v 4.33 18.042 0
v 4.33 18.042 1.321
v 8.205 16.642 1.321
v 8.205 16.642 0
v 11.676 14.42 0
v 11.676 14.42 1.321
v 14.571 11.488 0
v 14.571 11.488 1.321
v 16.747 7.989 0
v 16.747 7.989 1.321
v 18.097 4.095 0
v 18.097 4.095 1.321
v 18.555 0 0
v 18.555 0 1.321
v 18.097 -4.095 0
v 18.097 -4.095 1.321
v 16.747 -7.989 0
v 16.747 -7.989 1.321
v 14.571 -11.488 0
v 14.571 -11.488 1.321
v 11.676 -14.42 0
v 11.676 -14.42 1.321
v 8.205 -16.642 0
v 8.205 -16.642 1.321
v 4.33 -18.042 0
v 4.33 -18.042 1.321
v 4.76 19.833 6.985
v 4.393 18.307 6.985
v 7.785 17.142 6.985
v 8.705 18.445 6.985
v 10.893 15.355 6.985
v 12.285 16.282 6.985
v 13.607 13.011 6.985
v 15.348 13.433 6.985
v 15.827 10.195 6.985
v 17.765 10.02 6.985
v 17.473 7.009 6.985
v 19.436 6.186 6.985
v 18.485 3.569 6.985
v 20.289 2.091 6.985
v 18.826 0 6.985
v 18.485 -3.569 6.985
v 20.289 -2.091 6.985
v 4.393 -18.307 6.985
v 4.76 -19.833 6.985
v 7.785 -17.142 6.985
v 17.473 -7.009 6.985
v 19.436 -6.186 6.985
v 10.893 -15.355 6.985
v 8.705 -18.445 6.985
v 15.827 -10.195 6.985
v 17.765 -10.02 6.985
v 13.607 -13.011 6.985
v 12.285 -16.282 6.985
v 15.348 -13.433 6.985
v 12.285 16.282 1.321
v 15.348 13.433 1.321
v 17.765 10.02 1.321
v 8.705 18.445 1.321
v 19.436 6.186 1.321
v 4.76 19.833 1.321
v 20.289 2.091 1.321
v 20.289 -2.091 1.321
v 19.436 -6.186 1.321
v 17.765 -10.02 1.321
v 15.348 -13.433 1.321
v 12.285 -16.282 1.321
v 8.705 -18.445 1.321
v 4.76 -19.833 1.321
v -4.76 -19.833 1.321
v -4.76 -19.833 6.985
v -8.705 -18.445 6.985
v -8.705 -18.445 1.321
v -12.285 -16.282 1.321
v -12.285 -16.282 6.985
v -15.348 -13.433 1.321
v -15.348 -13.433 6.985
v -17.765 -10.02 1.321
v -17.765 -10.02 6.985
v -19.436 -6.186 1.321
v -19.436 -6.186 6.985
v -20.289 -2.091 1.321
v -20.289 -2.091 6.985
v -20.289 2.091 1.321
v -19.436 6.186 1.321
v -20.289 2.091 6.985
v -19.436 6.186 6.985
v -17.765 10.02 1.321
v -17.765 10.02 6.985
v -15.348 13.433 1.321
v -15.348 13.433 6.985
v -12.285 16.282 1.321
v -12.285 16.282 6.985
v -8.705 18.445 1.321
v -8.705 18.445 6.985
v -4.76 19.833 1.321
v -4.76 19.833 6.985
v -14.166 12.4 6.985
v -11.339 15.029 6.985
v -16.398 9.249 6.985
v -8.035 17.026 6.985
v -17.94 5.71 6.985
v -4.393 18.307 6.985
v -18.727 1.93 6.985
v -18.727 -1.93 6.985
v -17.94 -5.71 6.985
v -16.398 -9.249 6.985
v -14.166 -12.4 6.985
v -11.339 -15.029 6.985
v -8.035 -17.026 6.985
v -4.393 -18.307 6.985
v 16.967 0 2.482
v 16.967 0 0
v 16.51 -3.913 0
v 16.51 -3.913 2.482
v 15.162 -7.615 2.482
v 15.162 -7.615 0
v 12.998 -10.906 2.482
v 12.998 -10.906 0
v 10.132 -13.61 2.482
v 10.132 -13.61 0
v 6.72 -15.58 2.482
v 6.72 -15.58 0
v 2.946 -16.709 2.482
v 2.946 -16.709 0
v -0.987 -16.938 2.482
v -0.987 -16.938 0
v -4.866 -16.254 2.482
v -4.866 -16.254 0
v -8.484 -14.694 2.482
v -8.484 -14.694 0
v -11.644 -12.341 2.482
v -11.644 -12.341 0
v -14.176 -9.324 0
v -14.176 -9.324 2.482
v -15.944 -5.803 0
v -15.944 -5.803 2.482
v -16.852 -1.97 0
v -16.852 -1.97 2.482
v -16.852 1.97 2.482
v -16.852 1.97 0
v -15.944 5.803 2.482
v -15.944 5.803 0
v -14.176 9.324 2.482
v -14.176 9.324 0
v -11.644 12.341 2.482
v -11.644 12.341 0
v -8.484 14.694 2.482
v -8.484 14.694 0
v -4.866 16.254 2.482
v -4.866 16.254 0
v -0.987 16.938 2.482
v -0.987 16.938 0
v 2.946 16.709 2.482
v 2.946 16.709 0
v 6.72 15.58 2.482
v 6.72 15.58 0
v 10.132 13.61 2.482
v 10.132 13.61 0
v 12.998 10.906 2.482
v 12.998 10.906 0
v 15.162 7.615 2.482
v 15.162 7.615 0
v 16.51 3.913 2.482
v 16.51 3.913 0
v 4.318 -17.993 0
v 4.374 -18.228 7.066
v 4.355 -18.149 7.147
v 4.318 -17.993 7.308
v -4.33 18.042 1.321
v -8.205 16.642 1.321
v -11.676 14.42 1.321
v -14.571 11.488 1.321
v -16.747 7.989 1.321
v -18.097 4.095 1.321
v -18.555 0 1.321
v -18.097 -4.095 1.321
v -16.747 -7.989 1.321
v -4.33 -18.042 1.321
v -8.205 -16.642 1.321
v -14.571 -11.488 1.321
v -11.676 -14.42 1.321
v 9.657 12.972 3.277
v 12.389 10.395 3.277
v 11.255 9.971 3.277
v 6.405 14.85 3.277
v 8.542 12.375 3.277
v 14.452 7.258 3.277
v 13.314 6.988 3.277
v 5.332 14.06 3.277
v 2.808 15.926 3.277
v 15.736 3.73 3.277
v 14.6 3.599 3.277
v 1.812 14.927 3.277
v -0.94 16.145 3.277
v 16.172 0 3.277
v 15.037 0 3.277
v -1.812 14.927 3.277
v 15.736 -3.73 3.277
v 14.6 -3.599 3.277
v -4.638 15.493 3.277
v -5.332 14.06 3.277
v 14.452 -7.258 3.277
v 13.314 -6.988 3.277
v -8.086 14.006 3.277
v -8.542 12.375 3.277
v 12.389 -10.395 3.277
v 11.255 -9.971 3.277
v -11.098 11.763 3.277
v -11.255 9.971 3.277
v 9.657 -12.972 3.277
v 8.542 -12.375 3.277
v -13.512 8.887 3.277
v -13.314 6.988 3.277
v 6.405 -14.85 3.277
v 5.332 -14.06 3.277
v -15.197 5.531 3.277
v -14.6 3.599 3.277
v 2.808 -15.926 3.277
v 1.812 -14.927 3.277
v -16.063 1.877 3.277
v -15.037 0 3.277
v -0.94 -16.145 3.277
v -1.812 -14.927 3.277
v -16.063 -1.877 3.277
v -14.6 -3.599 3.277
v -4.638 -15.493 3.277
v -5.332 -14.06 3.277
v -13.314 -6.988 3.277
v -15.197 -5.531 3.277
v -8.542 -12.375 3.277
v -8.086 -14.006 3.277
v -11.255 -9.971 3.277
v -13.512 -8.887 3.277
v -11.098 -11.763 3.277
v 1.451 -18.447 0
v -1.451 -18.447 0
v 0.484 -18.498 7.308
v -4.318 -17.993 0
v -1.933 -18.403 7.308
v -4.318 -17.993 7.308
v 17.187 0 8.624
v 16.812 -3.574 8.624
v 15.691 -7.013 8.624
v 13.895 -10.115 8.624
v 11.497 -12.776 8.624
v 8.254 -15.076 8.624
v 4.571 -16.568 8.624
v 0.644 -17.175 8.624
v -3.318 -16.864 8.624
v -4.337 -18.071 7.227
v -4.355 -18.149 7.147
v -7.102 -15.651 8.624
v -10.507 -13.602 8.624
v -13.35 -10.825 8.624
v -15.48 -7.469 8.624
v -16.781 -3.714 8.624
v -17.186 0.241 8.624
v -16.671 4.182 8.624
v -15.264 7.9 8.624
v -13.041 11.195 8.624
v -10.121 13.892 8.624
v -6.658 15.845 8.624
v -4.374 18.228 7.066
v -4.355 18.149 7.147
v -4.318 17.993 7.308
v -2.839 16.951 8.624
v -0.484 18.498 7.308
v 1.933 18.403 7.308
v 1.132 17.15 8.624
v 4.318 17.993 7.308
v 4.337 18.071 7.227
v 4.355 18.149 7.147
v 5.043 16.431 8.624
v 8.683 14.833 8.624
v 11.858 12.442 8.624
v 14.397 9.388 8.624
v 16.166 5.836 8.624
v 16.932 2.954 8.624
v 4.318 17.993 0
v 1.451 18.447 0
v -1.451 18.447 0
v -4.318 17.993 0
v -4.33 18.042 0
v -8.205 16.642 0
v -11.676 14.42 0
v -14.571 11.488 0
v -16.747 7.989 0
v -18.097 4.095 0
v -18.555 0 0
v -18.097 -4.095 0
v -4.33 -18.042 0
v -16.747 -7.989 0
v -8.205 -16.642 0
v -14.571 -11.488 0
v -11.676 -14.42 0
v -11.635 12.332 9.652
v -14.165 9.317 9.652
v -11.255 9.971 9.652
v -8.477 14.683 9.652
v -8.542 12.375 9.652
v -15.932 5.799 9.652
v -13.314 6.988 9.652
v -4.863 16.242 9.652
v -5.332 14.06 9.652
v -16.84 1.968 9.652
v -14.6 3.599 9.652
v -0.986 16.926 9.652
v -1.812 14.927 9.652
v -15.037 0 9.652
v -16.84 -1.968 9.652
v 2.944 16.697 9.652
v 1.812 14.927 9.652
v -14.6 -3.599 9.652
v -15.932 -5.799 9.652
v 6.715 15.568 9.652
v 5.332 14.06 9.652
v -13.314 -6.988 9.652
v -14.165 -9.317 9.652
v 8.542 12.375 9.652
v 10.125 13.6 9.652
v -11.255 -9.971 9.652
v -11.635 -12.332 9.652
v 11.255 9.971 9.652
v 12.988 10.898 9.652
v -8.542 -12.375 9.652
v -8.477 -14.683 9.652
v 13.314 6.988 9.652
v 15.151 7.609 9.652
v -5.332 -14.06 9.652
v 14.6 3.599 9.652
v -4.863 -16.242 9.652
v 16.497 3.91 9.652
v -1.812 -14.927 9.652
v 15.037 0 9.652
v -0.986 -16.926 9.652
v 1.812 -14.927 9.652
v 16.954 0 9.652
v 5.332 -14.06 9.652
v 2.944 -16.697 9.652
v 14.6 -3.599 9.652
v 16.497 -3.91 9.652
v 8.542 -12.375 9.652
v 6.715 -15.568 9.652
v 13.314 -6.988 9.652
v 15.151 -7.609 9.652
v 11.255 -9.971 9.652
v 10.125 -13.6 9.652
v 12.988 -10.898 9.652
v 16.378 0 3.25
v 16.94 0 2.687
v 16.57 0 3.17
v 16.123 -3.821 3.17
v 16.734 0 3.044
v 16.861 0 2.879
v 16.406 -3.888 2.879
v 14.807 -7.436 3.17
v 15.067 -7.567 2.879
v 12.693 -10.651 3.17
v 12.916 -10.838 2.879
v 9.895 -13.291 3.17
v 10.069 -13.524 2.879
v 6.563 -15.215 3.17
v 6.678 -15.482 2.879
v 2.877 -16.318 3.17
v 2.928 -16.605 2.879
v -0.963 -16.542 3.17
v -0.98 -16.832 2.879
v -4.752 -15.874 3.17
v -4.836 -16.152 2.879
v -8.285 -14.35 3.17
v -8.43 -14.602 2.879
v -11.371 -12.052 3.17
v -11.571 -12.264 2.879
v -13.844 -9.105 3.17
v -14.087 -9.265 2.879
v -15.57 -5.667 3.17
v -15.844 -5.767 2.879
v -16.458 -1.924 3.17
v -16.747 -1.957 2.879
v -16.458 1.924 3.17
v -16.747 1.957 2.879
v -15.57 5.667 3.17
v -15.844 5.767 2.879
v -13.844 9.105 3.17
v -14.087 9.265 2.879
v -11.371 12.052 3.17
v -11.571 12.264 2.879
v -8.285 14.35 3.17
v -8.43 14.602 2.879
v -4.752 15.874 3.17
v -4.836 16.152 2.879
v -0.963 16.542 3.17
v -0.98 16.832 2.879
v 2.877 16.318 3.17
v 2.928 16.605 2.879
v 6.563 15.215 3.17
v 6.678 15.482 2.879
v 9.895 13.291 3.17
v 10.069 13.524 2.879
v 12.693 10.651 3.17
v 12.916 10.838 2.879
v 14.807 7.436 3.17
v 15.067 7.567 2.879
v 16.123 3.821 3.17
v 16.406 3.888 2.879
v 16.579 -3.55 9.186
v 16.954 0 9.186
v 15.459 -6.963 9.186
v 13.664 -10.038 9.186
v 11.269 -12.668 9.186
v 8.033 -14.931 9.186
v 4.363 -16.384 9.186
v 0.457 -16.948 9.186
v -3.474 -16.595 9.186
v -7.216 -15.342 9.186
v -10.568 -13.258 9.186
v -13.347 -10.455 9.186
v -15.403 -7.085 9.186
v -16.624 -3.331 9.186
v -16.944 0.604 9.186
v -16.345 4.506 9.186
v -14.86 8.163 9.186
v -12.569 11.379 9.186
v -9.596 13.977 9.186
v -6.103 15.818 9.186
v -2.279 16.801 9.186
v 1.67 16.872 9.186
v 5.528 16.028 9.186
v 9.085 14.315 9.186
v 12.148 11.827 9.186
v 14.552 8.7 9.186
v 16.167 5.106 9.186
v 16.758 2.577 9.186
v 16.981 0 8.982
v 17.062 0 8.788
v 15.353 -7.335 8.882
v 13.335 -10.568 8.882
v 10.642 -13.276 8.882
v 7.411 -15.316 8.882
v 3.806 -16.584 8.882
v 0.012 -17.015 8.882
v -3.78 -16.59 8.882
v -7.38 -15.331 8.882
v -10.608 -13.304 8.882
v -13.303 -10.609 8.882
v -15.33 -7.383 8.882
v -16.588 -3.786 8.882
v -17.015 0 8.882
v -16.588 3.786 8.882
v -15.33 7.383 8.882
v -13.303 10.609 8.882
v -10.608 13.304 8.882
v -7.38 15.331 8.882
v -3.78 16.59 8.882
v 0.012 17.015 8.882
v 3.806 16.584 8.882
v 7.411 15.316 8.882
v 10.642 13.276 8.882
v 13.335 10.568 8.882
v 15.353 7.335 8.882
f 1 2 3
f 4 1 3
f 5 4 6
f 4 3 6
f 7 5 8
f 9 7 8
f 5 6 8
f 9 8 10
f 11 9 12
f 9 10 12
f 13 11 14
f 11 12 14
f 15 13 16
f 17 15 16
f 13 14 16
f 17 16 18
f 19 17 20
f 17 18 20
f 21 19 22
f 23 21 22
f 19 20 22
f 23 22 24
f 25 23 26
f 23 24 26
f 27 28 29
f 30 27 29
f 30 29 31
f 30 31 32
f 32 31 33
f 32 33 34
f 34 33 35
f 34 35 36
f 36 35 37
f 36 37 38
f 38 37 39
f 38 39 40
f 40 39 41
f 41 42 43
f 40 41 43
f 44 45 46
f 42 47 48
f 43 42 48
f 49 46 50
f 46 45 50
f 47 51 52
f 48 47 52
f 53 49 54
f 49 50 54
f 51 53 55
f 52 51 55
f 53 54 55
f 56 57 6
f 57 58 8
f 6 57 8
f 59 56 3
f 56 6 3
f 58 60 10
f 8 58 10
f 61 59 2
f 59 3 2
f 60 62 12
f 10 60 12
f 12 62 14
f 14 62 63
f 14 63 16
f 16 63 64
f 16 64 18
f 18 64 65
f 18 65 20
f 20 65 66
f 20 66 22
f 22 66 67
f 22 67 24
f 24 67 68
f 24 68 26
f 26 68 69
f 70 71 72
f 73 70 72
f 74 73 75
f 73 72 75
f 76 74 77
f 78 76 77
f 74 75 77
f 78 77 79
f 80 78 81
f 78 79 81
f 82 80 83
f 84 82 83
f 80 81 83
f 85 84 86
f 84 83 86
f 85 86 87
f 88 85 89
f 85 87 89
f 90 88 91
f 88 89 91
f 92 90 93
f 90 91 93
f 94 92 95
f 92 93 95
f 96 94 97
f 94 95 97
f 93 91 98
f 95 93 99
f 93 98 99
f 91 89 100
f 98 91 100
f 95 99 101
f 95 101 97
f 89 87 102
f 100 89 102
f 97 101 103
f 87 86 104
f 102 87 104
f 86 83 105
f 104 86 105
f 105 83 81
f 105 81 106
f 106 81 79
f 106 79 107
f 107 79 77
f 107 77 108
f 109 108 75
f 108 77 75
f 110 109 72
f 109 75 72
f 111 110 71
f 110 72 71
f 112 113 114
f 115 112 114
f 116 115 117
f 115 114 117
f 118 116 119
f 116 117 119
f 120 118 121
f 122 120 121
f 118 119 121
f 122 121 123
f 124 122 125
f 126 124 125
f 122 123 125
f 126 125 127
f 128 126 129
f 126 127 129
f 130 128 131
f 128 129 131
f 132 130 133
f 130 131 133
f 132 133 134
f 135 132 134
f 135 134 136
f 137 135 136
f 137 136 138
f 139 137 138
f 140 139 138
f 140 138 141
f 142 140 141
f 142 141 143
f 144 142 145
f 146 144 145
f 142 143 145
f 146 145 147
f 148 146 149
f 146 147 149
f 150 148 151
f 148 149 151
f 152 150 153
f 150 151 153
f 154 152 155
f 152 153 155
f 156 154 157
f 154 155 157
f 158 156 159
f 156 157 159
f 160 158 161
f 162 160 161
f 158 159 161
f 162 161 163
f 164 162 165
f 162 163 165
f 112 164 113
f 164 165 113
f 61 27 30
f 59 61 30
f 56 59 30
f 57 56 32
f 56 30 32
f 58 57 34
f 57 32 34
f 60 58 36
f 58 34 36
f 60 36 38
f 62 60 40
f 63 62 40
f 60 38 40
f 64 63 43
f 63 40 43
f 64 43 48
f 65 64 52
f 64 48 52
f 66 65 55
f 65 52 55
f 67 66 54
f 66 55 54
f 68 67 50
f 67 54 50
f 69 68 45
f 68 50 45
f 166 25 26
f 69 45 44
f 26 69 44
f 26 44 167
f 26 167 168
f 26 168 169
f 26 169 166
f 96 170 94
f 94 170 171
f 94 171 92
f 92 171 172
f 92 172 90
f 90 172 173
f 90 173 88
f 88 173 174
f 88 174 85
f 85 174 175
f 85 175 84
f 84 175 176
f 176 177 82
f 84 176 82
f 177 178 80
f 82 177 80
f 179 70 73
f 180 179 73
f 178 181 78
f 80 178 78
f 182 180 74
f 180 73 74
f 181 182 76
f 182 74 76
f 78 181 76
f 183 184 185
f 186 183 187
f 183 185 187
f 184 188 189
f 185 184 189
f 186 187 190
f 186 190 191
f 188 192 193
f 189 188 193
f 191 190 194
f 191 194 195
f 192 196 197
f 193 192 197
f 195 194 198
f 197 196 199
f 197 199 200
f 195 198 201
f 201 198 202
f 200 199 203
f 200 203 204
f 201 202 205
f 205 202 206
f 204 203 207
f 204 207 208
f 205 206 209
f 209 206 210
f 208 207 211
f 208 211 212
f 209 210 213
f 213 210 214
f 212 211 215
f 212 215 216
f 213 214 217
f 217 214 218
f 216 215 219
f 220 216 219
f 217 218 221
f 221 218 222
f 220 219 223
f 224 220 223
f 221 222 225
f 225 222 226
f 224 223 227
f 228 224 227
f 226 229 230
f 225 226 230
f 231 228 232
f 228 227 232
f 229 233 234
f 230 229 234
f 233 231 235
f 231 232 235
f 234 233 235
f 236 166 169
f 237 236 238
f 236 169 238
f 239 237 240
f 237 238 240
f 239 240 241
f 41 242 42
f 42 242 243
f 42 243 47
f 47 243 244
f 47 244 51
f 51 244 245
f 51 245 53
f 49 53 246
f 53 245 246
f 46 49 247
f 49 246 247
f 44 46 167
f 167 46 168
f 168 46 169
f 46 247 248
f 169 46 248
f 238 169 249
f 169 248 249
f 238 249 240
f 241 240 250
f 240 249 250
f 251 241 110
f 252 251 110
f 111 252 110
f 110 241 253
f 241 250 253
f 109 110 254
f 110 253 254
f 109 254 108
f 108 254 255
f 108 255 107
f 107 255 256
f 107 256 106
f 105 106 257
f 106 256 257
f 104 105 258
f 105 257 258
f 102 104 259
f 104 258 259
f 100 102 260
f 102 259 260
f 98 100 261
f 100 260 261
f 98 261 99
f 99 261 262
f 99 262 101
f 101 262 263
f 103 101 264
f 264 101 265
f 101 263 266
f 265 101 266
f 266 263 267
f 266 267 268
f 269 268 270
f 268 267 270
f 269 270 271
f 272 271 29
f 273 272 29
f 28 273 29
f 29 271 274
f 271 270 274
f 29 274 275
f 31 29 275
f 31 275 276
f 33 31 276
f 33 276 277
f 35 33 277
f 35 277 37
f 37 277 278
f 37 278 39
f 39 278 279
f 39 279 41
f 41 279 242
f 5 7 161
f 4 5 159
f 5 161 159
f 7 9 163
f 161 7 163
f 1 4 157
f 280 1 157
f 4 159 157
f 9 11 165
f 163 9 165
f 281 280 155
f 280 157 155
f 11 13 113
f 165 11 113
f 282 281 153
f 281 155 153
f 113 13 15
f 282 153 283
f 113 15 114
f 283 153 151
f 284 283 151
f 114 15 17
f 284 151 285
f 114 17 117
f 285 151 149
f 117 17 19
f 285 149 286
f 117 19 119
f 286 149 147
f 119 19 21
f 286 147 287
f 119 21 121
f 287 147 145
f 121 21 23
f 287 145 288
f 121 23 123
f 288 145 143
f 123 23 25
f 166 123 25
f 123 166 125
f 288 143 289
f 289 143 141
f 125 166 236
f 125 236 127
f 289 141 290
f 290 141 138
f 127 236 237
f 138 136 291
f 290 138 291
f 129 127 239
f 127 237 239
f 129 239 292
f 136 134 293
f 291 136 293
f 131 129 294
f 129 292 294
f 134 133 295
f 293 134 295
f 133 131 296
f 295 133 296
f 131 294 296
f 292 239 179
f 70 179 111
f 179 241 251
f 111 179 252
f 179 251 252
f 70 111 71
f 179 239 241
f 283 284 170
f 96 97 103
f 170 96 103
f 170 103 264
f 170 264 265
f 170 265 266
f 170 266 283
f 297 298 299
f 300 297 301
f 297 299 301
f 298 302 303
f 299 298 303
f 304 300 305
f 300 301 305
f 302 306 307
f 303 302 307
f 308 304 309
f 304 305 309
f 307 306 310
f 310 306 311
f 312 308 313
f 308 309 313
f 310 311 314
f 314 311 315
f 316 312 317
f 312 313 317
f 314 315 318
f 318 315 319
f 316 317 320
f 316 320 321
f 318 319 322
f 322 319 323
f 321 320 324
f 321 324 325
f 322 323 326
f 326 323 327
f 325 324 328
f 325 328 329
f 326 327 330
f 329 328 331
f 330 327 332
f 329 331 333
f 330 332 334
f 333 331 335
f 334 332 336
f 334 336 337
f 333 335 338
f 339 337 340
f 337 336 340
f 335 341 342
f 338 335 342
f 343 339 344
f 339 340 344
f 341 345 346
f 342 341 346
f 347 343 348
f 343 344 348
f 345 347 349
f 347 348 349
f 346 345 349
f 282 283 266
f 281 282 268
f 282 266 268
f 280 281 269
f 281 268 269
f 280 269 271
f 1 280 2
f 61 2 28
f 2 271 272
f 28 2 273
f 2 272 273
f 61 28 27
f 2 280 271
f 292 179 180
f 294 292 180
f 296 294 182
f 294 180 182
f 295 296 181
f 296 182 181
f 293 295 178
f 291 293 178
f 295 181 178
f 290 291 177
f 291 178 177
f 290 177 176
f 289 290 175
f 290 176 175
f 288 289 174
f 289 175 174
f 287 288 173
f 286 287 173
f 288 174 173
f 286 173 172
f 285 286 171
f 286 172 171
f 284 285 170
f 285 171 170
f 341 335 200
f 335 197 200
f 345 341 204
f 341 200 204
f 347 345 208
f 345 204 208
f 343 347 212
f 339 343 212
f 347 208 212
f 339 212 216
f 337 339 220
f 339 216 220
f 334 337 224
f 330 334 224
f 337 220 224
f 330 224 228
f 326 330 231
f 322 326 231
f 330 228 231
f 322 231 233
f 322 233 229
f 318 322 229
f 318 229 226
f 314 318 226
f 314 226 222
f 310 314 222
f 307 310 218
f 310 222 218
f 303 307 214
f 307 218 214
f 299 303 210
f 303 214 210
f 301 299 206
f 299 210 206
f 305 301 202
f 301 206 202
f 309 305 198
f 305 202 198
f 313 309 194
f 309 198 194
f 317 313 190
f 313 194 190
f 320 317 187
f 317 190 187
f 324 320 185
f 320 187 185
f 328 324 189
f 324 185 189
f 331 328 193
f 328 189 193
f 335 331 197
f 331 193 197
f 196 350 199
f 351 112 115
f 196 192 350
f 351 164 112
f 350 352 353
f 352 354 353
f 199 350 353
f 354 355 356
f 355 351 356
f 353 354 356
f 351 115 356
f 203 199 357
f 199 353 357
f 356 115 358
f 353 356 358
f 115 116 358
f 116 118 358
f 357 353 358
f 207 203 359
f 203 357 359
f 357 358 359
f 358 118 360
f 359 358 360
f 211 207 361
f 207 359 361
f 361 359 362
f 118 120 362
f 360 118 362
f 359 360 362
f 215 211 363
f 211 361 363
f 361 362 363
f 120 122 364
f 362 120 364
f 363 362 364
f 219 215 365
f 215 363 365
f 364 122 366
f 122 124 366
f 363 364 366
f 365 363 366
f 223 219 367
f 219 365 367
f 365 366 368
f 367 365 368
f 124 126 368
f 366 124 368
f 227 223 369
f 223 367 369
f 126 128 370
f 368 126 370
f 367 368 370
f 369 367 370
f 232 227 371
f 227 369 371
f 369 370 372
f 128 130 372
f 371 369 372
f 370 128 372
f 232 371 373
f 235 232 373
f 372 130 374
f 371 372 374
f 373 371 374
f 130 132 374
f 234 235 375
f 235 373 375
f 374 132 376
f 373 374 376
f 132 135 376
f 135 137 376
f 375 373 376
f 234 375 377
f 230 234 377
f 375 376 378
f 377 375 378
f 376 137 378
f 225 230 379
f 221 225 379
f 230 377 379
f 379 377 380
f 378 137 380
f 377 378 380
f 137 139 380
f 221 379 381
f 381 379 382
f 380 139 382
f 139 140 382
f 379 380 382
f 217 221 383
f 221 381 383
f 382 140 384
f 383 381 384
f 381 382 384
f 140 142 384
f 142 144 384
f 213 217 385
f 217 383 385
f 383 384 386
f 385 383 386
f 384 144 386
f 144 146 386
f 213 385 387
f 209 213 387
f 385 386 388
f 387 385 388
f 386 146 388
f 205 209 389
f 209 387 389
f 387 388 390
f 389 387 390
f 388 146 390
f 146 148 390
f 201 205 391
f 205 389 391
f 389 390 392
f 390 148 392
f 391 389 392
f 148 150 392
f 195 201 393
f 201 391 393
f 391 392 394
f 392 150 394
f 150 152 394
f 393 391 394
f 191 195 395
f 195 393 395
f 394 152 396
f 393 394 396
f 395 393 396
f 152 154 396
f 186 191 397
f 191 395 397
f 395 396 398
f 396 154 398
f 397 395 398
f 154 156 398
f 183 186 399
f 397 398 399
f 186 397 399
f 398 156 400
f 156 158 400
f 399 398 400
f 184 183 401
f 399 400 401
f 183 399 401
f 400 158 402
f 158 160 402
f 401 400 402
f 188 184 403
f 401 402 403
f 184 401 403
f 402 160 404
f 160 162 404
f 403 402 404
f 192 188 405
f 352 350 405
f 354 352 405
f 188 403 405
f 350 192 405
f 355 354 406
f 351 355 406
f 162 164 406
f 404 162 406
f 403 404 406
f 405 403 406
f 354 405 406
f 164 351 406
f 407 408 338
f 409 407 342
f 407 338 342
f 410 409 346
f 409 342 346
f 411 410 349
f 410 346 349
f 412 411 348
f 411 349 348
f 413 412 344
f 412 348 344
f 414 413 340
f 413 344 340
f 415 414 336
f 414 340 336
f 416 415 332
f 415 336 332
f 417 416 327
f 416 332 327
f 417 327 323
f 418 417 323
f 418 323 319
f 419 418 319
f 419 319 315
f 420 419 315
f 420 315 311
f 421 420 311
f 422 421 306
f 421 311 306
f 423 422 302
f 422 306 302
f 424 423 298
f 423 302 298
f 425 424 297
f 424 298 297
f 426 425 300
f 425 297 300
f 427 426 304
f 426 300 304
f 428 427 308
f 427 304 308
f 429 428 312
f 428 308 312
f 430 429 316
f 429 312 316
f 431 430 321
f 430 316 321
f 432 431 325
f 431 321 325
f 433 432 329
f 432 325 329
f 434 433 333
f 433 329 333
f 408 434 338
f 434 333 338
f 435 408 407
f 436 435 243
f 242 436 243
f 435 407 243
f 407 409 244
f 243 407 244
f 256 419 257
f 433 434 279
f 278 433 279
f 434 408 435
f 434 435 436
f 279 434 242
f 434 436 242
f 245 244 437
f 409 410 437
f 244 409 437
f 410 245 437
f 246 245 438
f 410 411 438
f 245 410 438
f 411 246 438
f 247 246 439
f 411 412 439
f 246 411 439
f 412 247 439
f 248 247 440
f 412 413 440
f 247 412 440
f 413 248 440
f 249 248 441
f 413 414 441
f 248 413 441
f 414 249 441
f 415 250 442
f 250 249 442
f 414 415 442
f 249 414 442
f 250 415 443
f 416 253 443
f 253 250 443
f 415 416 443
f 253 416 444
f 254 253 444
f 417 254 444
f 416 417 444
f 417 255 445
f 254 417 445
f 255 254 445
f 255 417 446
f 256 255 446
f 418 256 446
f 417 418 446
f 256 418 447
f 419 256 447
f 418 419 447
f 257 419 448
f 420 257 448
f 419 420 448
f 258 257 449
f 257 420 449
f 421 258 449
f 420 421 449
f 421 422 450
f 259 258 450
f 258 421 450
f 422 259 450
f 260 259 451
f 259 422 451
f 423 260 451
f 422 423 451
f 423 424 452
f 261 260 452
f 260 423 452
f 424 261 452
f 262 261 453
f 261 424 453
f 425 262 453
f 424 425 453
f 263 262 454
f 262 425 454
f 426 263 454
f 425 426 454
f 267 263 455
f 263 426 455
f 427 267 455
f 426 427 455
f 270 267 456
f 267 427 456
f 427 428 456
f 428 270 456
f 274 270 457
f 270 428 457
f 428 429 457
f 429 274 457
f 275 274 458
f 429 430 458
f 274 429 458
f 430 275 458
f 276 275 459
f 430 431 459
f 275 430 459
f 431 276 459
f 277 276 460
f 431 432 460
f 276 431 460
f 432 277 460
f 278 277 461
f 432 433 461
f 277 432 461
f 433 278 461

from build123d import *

# Parameters (mm, degrees)
F2_R     = 0.79502
F4_DEPTH = 9.653
F5_R     = 0.79502


with BuildPart() as f1:
    # F0 (on Front) → F1 (revolve)
    with BuildSketch(Plane.XZ):
        Polygon((16.9545, 9.652), (15.0368, 9.652), (15.0368, 3.2766), (16.9672, 3.2766), (16.9672, 0), (18.5547, 0), (18.5547, 1.3208), (20.3962, 1.3208), (20.3962, 6.985), (18.82648, 6.985), (16.9545, 8.85698), align=None)
    revolve(axis=Axis((0, 0, 4.540607), (0, 0, -1)))

    # F2
    f2_edges = [f1.edges().sort_by_distance(p)[0] for p in [
        (-16.9672, 0, 3.2766),
    ]]
    fillet(f2_edges, radius=F2_R)

    # F3 (on face) → F4 (cut, through all)
    with BuildSketch(Plane.XY.offset(9.652)):
        with BuildLine():
            Line((-4.75958, 19.833088), (-4.318, 17.993032))
            ThreePointArc((-4.318, 17.993032), (0, 18.5039), (4.318, 17.993032))
            Line((4.318, 17.993032), (4.75958, 19.833088))
            ThreePointArc((4.75958, 19.833088), (0, 20.3962), (-4.75958, 19.833088))
        make_face()
        with BuildLine():
            ThreePointArc((4.318, -17.993032), (0, -18.5039), (-4.318, -17.993032))
            Line((-4.318, -17.993032), (-4.75958, -19.833088))
            ThreePointArc((-4.75958, -19.833088), (0, -20.3962), (4.75958, -19.833088))
            Line((4.75958, -19.833088), (4.318, -17.993032))
        make_face()
    extrude(amount=-F4_DEPTH, mode=Mode.SUBTRACT)

    # F5
    f5_edges = [f1.edges().sort_by_distance(p)[0] for p in [
        (-16.9545, 0, 8.85698),
    ]]
    fillet(f5_edges, radius=F5_R)


solid = f1.part
